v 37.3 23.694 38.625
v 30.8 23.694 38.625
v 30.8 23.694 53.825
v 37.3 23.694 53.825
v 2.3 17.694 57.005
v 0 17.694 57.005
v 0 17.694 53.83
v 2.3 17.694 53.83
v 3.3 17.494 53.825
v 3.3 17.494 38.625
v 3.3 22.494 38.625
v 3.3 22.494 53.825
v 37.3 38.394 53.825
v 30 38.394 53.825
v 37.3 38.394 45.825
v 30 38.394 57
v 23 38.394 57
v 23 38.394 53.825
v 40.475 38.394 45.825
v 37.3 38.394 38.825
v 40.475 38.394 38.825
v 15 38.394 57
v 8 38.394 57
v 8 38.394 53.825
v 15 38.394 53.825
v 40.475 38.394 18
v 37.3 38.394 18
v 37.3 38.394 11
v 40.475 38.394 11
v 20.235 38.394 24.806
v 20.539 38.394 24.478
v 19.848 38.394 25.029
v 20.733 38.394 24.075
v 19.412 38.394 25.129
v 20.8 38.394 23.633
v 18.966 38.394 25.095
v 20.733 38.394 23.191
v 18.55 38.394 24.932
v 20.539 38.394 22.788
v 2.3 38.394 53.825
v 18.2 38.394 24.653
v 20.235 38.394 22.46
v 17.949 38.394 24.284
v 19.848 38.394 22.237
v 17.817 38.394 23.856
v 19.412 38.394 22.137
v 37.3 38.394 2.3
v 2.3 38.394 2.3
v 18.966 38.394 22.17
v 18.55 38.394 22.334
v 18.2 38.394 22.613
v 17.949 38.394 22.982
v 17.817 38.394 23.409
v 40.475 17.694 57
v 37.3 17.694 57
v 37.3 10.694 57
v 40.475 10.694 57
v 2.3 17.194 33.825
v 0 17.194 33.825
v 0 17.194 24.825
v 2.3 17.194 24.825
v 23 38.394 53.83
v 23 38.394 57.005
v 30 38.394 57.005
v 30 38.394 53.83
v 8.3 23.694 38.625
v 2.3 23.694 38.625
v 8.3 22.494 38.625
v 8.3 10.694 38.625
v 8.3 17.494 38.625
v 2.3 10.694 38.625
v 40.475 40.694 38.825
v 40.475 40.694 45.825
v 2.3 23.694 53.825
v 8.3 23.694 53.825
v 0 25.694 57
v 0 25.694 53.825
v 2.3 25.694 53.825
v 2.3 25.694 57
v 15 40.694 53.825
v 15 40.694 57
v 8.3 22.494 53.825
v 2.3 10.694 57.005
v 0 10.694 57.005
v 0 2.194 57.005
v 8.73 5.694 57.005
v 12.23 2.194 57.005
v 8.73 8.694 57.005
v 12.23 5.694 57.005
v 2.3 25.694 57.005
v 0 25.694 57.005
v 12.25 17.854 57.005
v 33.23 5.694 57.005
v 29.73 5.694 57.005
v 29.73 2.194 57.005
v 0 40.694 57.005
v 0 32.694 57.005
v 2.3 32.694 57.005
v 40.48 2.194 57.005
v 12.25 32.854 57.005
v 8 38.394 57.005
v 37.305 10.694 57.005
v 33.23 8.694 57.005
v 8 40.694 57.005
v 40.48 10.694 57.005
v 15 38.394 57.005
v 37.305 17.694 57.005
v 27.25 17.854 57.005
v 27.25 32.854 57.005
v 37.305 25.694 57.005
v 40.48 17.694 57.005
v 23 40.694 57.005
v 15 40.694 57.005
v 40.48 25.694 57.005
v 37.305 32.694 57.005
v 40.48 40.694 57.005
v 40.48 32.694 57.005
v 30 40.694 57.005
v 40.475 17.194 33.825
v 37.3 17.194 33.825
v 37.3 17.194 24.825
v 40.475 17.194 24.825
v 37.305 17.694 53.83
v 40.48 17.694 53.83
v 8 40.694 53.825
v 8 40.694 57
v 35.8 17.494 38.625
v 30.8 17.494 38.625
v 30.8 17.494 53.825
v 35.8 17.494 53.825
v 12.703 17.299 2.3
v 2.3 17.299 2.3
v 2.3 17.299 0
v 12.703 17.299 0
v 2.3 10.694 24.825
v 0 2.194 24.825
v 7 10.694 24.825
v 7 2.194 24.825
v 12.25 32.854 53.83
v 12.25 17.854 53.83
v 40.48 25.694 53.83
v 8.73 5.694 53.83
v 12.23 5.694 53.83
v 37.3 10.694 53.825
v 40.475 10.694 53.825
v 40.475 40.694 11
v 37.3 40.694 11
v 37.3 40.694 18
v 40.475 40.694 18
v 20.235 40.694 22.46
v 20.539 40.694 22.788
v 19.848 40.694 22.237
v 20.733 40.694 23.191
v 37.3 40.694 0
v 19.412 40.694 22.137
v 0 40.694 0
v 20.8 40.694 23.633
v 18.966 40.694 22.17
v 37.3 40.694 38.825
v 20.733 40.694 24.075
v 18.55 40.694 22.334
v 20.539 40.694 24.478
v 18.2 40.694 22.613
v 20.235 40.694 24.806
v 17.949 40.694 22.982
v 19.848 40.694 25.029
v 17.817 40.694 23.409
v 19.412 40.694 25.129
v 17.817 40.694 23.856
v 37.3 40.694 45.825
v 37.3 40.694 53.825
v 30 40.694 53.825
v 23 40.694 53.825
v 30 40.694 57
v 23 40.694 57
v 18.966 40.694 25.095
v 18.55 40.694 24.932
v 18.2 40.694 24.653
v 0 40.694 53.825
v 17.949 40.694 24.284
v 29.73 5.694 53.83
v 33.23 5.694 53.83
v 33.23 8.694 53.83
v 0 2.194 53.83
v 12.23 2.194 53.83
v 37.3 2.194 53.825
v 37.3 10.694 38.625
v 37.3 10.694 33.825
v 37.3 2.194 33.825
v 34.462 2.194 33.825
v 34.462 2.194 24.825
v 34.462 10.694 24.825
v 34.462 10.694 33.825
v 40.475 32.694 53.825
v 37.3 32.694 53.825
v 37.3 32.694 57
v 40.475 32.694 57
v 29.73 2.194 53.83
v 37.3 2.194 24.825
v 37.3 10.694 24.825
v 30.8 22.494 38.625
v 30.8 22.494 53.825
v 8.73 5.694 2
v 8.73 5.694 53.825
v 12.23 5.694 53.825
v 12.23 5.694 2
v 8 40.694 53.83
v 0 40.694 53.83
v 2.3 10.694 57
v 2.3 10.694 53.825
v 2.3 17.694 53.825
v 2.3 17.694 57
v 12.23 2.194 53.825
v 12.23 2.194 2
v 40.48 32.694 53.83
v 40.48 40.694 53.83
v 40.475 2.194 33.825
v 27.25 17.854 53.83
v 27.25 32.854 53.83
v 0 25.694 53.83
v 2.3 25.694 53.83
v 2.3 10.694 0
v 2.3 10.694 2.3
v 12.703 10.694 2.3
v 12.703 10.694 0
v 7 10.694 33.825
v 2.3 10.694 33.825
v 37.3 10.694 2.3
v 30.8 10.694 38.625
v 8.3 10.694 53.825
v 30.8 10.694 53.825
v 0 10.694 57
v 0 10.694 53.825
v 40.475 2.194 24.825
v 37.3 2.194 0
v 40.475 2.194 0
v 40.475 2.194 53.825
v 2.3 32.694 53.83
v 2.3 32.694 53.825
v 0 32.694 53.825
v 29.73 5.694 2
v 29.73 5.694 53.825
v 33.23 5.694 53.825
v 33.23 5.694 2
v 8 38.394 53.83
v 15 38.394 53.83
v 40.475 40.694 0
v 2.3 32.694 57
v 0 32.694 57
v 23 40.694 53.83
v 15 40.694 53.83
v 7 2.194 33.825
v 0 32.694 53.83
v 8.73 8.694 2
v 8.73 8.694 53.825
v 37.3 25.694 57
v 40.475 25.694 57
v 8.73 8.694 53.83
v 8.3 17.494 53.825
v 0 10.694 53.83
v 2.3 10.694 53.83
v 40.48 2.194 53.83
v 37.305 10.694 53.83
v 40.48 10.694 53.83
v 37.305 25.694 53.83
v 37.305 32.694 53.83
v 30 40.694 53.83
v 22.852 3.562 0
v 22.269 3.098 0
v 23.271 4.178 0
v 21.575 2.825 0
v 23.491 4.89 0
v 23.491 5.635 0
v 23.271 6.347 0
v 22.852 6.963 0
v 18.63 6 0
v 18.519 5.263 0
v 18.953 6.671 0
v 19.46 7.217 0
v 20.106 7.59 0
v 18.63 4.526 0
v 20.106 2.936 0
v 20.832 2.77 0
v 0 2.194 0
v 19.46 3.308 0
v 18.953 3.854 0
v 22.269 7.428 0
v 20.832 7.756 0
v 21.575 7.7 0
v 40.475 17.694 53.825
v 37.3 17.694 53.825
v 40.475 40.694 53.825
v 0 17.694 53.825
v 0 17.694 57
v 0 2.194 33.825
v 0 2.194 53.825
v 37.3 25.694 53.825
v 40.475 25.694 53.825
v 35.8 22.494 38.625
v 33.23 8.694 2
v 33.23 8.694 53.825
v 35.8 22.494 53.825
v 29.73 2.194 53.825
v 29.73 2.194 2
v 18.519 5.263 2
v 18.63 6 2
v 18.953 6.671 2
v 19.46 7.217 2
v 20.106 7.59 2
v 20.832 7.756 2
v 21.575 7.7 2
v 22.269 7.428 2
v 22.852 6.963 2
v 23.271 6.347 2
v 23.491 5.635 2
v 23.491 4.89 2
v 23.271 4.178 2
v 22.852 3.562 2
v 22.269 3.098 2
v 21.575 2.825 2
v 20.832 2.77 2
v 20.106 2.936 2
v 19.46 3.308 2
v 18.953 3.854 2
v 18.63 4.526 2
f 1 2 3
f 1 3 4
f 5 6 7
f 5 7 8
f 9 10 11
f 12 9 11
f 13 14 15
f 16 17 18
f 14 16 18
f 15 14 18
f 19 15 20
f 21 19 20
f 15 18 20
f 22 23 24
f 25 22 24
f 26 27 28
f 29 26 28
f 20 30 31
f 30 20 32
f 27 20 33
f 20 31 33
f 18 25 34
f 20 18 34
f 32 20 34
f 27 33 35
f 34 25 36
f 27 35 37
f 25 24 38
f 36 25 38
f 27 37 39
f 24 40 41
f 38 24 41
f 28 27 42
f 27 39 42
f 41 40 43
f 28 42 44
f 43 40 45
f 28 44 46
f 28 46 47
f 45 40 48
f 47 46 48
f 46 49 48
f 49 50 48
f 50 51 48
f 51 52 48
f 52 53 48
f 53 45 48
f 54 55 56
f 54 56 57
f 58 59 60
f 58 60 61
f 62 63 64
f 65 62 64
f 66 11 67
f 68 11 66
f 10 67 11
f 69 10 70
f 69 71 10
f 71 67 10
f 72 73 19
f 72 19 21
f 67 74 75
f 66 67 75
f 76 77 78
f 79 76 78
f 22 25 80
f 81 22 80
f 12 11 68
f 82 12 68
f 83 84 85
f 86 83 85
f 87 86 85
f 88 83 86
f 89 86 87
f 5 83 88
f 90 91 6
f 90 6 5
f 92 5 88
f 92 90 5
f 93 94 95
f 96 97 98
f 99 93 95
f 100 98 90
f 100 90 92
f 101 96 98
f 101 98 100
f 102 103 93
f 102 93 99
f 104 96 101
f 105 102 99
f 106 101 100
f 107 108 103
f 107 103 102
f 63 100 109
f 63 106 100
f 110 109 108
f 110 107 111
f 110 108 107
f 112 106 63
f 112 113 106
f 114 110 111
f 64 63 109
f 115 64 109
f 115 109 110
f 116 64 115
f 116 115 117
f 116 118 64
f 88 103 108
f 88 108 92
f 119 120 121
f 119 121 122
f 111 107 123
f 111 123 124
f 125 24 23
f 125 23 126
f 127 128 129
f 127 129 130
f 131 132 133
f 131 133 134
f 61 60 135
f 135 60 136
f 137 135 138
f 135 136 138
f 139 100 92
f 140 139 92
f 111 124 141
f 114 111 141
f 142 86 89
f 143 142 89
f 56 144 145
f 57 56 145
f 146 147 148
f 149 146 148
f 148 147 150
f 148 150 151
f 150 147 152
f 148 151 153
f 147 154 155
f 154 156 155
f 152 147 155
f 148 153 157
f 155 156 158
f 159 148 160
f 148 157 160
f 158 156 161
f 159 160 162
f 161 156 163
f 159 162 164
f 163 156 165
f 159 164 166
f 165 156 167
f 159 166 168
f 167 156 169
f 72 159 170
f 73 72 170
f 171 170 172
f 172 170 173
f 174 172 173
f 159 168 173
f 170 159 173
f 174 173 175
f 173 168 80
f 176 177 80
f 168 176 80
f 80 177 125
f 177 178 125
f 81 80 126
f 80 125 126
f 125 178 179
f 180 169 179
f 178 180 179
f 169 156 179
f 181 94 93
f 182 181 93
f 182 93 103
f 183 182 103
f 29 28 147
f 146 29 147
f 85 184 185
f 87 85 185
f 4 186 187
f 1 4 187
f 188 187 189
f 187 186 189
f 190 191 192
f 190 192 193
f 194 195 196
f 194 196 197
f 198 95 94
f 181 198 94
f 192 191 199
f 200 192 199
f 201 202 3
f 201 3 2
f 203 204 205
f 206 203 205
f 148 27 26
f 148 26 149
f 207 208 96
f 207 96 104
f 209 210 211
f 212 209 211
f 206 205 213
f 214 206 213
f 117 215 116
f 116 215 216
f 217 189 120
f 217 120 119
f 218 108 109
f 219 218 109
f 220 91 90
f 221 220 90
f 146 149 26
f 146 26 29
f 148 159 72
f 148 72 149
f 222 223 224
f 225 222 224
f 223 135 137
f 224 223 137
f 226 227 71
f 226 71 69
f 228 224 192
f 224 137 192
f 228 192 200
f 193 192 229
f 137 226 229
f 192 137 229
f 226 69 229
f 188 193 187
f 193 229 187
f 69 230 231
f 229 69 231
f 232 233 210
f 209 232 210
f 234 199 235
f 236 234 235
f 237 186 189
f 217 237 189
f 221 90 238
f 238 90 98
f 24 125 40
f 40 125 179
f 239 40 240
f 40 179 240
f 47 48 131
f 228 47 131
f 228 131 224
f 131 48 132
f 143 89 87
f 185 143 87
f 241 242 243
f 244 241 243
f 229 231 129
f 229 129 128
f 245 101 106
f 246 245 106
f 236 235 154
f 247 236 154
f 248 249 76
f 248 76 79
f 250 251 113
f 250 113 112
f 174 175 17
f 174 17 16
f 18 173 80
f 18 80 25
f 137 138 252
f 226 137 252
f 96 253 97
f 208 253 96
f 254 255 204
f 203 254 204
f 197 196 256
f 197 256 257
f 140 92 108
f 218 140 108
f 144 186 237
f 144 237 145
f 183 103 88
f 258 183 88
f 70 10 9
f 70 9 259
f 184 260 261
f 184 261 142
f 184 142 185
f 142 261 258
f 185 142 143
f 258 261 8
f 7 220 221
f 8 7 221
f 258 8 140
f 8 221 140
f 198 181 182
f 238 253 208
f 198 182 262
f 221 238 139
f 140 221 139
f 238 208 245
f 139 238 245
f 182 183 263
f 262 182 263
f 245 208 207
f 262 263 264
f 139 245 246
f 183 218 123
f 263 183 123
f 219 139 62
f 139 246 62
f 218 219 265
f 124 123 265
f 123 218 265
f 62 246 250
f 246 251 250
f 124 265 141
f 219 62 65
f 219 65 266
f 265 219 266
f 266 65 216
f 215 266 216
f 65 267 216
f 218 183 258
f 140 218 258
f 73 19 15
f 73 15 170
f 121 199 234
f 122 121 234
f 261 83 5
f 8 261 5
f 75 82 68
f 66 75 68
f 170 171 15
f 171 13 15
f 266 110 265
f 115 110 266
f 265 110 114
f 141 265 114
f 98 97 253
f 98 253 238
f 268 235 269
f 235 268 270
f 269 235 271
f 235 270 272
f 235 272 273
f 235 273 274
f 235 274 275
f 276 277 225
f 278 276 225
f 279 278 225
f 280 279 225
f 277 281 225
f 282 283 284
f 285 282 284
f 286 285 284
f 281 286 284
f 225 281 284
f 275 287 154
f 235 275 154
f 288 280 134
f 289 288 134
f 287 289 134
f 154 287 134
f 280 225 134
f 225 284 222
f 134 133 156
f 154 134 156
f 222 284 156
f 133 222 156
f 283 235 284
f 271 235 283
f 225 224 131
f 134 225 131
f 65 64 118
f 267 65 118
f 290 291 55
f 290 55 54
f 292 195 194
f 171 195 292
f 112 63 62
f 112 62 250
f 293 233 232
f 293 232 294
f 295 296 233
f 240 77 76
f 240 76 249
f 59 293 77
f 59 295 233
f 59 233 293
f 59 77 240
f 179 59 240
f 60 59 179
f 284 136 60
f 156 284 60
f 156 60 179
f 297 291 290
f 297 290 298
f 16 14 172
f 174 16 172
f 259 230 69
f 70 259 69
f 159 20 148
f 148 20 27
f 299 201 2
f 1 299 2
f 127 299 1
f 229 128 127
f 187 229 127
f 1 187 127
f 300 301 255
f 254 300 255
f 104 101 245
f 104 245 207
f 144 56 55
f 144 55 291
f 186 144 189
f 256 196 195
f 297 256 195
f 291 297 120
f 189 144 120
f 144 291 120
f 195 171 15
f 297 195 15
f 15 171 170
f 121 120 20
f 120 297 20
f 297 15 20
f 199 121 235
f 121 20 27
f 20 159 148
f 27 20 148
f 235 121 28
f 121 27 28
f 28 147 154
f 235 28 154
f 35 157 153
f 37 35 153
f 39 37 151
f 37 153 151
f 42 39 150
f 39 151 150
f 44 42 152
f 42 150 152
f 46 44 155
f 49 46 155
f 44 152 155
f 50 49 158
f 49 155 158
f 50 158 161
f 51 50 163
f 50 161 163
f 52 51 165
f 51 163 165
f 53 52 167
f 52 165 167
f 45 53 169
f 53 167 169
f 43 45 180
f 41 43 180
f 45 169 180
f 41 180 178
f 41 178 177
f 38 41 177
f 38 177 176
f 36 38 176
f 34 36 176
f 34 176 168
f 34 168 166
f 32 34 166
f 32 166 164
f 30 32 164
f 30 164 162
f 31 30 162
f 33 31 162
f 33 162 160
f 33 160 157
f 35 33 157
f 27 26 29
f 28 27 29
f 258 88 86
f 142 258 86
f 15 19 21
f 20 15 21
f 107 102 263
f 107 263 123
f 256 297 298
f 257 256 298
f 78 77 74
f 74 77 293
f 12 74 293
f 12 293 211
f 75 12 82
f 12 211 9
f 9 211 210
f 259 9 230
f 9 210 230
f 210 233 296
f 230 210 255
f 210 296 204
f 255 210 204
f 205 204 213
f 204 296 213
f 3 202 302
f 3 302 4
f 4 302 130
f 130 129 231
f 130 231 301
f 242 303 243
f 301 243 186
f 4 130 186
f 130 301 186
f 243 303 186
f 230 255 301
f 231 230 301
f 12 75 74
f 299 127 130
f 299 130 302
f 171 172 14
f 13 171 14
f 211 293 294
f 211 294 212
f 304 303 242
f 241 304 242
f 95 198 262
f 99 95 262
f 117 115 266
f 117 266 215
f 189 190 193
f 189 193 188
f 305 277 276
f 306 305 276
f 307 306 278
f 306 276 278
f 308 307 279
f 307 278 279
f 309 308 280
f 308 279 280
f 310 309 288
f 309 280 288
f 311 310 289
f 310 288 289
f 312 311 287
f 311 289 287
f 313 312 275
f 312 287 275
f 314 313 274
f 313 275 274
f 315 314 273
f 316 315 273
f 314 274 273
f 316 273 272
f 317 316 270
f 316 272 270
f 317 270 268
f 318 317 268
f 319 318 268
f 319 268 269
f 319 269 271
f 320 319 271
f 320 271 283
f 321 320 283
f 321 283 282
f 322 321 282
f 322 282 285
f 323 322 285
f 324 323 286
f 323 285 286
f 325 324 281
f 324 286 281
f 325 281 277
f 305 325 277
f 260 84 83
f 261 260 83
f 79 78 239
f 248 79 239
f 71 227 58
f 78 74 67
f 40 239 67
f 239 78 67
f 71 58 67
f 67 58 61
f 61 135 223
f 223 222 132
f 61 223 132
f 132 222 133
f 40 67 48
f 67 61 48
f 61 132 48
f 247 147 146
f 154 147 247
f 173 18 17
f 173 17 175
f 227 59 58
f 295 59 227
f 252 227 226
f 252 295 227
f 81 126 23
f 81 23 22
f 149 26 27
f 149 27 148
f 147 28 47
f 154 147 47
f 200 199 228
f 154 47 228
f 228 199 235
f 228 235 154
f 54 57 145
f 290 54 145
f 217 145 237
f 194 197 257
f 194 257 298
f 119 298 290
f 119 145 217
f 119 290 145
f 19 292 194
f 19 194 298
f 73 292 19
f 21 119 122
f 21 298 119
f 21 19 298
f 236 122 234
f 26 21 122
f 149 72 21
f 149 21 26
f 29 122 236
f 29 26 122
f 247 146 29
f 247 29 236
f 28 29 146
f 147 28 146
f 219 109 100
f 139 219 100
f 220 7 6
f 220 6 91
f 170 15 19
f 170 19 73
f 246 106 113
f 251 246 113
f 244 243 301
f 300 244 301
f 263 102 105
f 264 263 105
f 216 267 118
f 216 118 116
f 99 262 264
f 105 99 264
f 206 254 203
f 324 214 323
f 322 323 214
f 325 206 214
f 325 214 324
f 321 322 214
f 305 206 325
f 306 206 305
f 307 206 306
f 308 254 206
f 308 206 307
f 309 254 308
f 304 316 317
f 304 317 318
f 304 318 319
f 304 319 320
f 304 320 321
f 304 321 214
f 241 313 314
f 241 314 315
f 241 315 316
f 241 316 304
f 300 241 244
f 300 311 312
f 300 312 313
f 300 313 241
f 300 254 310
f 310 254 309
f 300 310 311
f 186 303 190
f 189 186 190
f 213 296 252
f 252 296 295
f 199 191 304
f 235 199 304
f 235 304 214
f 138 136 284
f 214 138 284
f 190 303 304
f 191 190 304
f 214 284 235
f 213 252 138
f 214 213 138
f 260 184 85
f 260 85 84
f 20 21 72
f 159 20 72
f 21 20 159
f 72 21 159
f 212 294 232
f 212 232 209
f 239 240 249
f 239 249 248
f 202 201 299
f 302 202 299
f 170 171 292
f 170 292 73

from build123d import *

# Parameters (mm, degrees)
SKETCH1_W                    = 53.825
SKETCH1_H                    = 38.5
MAIN_EXTRUDE_DEPTH           = 2.3
WALLS_DEPTH                  = 35
SKETCH36_W                   = 7
SKETCH36_H                   = 2.3
SKETCH36_W_2                 = 2.3
SKETCH36_H_2                 = 7
PUZZLE_MAIN_WALLS_DEPTH      = 3.175
SKETCH25_W                   = 10.403042977
SKETCH25_H                   = 6.605151166
WIRE_HOLE_DEPTH              = 3.3
SKETCH19_W                   = 6.5
SKETCH19_H                   = 15.2
SKETCH19_W_2                 = 6
IR_MOUNT_DEPTH               = 7
MAGNET_MOUNT_HOLE_DEPTH      = 51.83
SKETCH40_R                   = 1.5
LED_SPACE_DEPTH              = 3
SKETCH42_W                   = 7
SKETCH42_H                   = 2.3
BOSS_EXTRUDE15_DEPTH         = 3.175
SKETCH44_W                   = 6
SKETCH44_H                   = 15.2
SKETCH44_W_2                 = 6.5
BOSS_EXTRUDE16_DEPTH         = 6
SKETCH45_W                   = 5
SKETCH45_H                   = 5
IR_PLACEMENT_DEPTH           = 15.2
SKETCH47_R                   = 2.5
CUT_EXTRUDE2_DEPTH           = 2
SKETCH48_W                   = 7
SKETCH48_H                   = 9
CUT_EXTRUDE3_DEPTH           = 15
SKETCH6_W                    = 40.48
SKETCH6_H                    = 38.5
FRONT_LID_DEPTH              = 3.175
NOSEPOKE_HOLE_DEPTH          = 3.175
SKETCH34_W                   = 2.3
SKETCH34_H                   = 7
SKETCH34_W_2                 = 7
SKETCH34_H_2                 = 2.3
SKETCH34_W_3                 = 3.175
PUZZLE_FRONT_LID_DEPTH       = 3.175
MAGNET_MOUNT_FRONT_LID_DEPTH = 3.175
SKETCH20_W                   = 53.825
SKETCH20_H                   = 38.5
SIDE_MAIN_DEPTH              = 3.175
SKETCH37_W                   = 3.175
SKETCH37_H                   = 7
PUZZLE_SIDE_PART_DEPTH       = 3.175
SKETCH41_W                   = 7
SKETCH41_H                   = 2.3
CUT_EXTRUDE1_DEPTH           = 3.175
SKETCH49_W                   = 7
SKETCH49_H                   = 9
CUT_EXTRUDE4_DEPTH           = 15


with BuildPart() as part:
    # Sketch1 → main extrude (new body)
    with BuildSketch(Plane(origin=(0, 0, 0), x_dir=(0, 0, -1), z_dir=(1, 0, 0))):
        with Locations((-26.9125, 21.443980352)):
            Rectangle(SKETCH1_W, SKETCH1_H)
    extrude(amount=MAIN_EXTRUDE_DEPTH)

    # Sketch3 → walls (add)
    with BuildSketch(Plane(origin=(2.3, 0, 0), x_dir=(0, 0, -1), z_dir=(1, 0, 0))):
        Polygon((-2.3, 38.393980352), (-2.3, 10.693980352), (-53.825, 10.693980352), (-53.825, 2.193980352), (0, 2.193980352), (0, 40.693980352), (-53.825, 40.693980352), (-53.825, 38.393980352), align=None)
    extrude(amount=WALLS_DEPTH)

    # Sketch36 → Puzzle (main walls) (add)
    with BuildSketch(Plane.XY.offset(53.825)):
        with Locations((11.5, 39.543980352)):
            Rectangle(SKETCH36_W, SKETCH36_H)
        with Locations((26.5, 39.543980352)):
            Rectangle(SKETCH36_W, SKETCH36_H)
        with Locations((1.15, 29.193980352)):
            Rectangle(SKETCH36_W_2, SKETCH36_H_2)
        with Locations((1.15, 14.193980352)):
            Rectangle(SKETCH36_W_2, SKETCH36_H_2)
    extrude(amount=PUZZLE_MAIN_WALLS_DEPTH)

    # Sketch25 → Wire Hole (cut, through all)
    with BuildSketch(Plane.XY.offset(2.3)):
        with Locations((7.501521489, 13.996555935)):
            Rectangle(SKETCH25_W, SKETCH25_H)
    extrude(amount=-WIRE_HOLE_DEPTH, mode=Mode.SUBTRACT)

    # Sketch19 → IR mount (add)
    with BuildSketch(Plane(origin=(0, 10.693980352, 0), x_dir=(1, 0, 0), z_dir=(0, 1, 0))):
        with Locations((34.05, -46.225)):
            Rectangle(SKETCH19_W, SKETCH19_H)
        with Locations((5.3, -46.225)):
            Rectangle(SKETCH19_W_2, SKETCH19_H)
    extrude(amount=IR_MOUNT_DEPTH)

    # Sketch24 → Magnet Mount Hole (cut)
    with BuildSketch(Plane.XY.offset(53.83)):
        Polygon((12.23, 2.193980352), (29.73, 2.193980352), (29.73, 5.693980352), (33.23, 5.693980352), (33.23, 8.693980352), (8.73, 8.693980352), (8.73, 5.693980352), (12.23, 5.693980352), align=None)
    extrude(amount=-MAGNET_MOUNT_HOLE_DEPTH, mode=Mode.SUBTRACT)

    # Sketch40 → LED Space (cut)
    with BuildSketch(Plane(origin=(0, 40.693980352, 0), x_dir=(1, 0, 0), z_dir=(0, 1, 0))):
        with Locations((19.3, -23.632870167)):
            Circle(SKETCH40_R)
    extrude(amount=-LED_SPACE_DEPTH, mode=Mode.SUBTRACT)

    # Sketch42 → Boss-Extrude15 (add)
    with BuildSketch(Plane(origin=(37.3, 0, 0), x_dir=(0, 0, -1), z_dir=(1, 0, 0))):
        with Locations((-42.325, 39.543980352)):
            Rectangle(SKETCH42_W, SKETCH42_H)
        with Locations((-14.5, 39.543980352)):
            Rectangle(SKETCH42_W, SKETCH42_H)
    extrude(amount=BOSS_EXTRUDE15_DEPTH)

    # Sketch44 → Boss-Extrude16 (add)
    with BuildSketch(Plane(origin=(0, 17.693980352, 0), x_dir=(1, 0, 0), z_dir=(0, 1, 0))):
        with Locations((5.3, -46.225)):
            Rectangle(SKETCH44_W, SKETCH44_H)
        with Locations((34.05, -46.225)):
            Rectangle(SKETCH44_W_2, SKETCH44_H)
    extrude(amount=BOSS_EXTRUDE16_DEPTH)

    # Sketch45 → IR placement (cut)
    with BuildSketch(Plane.XY.offset(53.825)):
        with Locations((33.3, 19.993980352)):
            Rectangle(SKETCH45_W, SKETCH45_H)
        with Locations((5.8, 19.993980352)):
            Rectangle(SKETCH45_W, SKETCH45_H)
    extrude(amount=-IR_PLACEMENT_DEPTH, mode=Mode.SUBTRACT)

    # Sketch47 → Cut-Extrude2 (cut)
    with BuildSketch(Plane(origin=(0, 0, 0), x_dir=(-1, 0, 0), z_dir=(0, 0, -1))):
        with Locations((-21.018982331, 5.262699137)):
            Circle(SKETCH47_R)
    extrude(amount=-CUT_EXTRUDE2_DEPTH, mode=Mode.SUBTRACT)

    # Sketch48 → Cut-Extrude3 (cut)
    with BuildSketch(Plane.XZ.offset(-2.193980352)):
        with Locations((3.5, 29.325)):
            Rectangle(SKETCH48_W, SKETCH48_H)
        with Locations((37.962462444, 29.325)):
            Rectangle(SKETCH48_W, SKETCH48_H)
    extrude(amount=-CUT_EXTRUDE3_DEPTH, mode=Mode.SUBTRACT)


with BuildPart() as body_2:
    # Sketch6 → front lid (new body)
    with BuildSketch(Plane.XY.offset(53.83)):
        with Locations((20.24, 21.443980352)):
            Rectangle(SKETCH6_W, SKETCH6_H)
    extrude(amount=FRONT_LID_DEPTH)

    # Sketch7 → nosepoke hole (cut)
    with BuildSketch(Plane.XY.offset(57.005)):
        Polygon((19.75, 17.853980352), (27.25, 17.853980352), (27.25, 32.853980352), (12.25, 32.853980352), (12.25, 17.853980352), align=None)
    extrude(amount=-NOSEPOKE_HOLE_DEPTH, mode=Mode.SUBTRACT)

    # Sketch34 → Puzzle (Front Lid) (cut)
    with BuildSketch(Plane.XY.offset(57.005)):
        with Locations((1.15, 29.193980352)):
            Rectangle(SKETCH34_W, SKETCH34_H)
        with Locations((11.5, 39.543980352)):
            Rectangle(SKETCH34_W_2, SKETCH34_H_2)
        with Locations((26.5, 39.543980352)):
            Rectangle(SKETCH34_W_2, SKETCH34_H_2)
        with Locations((1.15, 14.193980352)):
            Rectangle(SKETCH34_W, SKETCH34_H)
        with Locations((38.8925, 29.193980352)):
            Rectangle(SKETCH34_W_3, SKETCH34_H)
        with Locations((38.8925, 14.193980352)):
            Rectangle(SKETCH34_W_3, SKETCH34_H)
    extrude(amount=-PUZZLE_FRONT_LID_DEPTH, mode=Mode.SUBTRACT)

    # Sketch46 → magnet mount front lid (cut)
    with BuildSketch(Plane.XY.offset(57.005)):
        Polygon((12.23, 2.193980352), (29.73, 2.193980352), (29.73, 5.693980352), (33.23, 5.693980352), (33.23, 8.693980352), (8.73, 8.693980352), (8.73, 5.693980352), (12.23, 5.693980352), align=None)
    extrude(amount=-MAGNET_MOUNT_FRONT_LID_DEPTH, mode=Mode.SUBTRACT)


with BuildPart() as body_3:
    # Sketch20 → Side main (new body)
    with BuildSketch(Plane(origin=(37.3, 0, 0), x_dir=(0, 0, -1), z_dir=(1, 0, 0))):
        with Locations((-26.9125, 21.443980352)):
            Rectangle(SKETCH20_W, SKETCH20_H)
    extrude(amount=SIDE_MAIN_DEPTH)

    # Sketch37 → Puzzle (side part) (add)
    with BuildSketch(Plane.XY.offset(53.825)):
        with Locations((38.8875, 29.193980352)):
            Rectangle(SKETCH37_W, SKETCH37_H)
        with Locations((38.8875, 14.193980352)):
            Rectangle(SKETCH37_W, SKETCH37_H)
    extrude(amount=PUZZLE_SIDE_PART_DEPTH)

    # Sketch41 → Cut-Extrude1 (cut)
    with BuildSketch(Plane(origin=(40.475, 0, 0), x_dir=(0, 0, -1), z_dir=(1, 0, 0))):
        with Locations((-42.325, 39.543980352)):
            Rectangle(SKETCH41_W, SKETCH41_H)
        with Locations((-14.5, 39.543980352)):
            Rectangle(SKETCH41_W, SKETCH41_H)
    extrude(amount=-CUT_EXTRUDE1_DEPTH, mode=Mode.SUBTRACT)

    # Sketch49 → Cut-Extrude4 (cut)
    with BuildSketch(Plane.XZ.offset(-2.193980352)):
        with Locations((36.975, 29.325)):
            Rectangle(SKETCH49_W, SKETCH49_H)
    extrude(amount=-CUT_EXTRUDE4_DEPTH, mode=Mode.SUBTRACT)


solid = Compound([part.part, body_2.part, body_3.part])
